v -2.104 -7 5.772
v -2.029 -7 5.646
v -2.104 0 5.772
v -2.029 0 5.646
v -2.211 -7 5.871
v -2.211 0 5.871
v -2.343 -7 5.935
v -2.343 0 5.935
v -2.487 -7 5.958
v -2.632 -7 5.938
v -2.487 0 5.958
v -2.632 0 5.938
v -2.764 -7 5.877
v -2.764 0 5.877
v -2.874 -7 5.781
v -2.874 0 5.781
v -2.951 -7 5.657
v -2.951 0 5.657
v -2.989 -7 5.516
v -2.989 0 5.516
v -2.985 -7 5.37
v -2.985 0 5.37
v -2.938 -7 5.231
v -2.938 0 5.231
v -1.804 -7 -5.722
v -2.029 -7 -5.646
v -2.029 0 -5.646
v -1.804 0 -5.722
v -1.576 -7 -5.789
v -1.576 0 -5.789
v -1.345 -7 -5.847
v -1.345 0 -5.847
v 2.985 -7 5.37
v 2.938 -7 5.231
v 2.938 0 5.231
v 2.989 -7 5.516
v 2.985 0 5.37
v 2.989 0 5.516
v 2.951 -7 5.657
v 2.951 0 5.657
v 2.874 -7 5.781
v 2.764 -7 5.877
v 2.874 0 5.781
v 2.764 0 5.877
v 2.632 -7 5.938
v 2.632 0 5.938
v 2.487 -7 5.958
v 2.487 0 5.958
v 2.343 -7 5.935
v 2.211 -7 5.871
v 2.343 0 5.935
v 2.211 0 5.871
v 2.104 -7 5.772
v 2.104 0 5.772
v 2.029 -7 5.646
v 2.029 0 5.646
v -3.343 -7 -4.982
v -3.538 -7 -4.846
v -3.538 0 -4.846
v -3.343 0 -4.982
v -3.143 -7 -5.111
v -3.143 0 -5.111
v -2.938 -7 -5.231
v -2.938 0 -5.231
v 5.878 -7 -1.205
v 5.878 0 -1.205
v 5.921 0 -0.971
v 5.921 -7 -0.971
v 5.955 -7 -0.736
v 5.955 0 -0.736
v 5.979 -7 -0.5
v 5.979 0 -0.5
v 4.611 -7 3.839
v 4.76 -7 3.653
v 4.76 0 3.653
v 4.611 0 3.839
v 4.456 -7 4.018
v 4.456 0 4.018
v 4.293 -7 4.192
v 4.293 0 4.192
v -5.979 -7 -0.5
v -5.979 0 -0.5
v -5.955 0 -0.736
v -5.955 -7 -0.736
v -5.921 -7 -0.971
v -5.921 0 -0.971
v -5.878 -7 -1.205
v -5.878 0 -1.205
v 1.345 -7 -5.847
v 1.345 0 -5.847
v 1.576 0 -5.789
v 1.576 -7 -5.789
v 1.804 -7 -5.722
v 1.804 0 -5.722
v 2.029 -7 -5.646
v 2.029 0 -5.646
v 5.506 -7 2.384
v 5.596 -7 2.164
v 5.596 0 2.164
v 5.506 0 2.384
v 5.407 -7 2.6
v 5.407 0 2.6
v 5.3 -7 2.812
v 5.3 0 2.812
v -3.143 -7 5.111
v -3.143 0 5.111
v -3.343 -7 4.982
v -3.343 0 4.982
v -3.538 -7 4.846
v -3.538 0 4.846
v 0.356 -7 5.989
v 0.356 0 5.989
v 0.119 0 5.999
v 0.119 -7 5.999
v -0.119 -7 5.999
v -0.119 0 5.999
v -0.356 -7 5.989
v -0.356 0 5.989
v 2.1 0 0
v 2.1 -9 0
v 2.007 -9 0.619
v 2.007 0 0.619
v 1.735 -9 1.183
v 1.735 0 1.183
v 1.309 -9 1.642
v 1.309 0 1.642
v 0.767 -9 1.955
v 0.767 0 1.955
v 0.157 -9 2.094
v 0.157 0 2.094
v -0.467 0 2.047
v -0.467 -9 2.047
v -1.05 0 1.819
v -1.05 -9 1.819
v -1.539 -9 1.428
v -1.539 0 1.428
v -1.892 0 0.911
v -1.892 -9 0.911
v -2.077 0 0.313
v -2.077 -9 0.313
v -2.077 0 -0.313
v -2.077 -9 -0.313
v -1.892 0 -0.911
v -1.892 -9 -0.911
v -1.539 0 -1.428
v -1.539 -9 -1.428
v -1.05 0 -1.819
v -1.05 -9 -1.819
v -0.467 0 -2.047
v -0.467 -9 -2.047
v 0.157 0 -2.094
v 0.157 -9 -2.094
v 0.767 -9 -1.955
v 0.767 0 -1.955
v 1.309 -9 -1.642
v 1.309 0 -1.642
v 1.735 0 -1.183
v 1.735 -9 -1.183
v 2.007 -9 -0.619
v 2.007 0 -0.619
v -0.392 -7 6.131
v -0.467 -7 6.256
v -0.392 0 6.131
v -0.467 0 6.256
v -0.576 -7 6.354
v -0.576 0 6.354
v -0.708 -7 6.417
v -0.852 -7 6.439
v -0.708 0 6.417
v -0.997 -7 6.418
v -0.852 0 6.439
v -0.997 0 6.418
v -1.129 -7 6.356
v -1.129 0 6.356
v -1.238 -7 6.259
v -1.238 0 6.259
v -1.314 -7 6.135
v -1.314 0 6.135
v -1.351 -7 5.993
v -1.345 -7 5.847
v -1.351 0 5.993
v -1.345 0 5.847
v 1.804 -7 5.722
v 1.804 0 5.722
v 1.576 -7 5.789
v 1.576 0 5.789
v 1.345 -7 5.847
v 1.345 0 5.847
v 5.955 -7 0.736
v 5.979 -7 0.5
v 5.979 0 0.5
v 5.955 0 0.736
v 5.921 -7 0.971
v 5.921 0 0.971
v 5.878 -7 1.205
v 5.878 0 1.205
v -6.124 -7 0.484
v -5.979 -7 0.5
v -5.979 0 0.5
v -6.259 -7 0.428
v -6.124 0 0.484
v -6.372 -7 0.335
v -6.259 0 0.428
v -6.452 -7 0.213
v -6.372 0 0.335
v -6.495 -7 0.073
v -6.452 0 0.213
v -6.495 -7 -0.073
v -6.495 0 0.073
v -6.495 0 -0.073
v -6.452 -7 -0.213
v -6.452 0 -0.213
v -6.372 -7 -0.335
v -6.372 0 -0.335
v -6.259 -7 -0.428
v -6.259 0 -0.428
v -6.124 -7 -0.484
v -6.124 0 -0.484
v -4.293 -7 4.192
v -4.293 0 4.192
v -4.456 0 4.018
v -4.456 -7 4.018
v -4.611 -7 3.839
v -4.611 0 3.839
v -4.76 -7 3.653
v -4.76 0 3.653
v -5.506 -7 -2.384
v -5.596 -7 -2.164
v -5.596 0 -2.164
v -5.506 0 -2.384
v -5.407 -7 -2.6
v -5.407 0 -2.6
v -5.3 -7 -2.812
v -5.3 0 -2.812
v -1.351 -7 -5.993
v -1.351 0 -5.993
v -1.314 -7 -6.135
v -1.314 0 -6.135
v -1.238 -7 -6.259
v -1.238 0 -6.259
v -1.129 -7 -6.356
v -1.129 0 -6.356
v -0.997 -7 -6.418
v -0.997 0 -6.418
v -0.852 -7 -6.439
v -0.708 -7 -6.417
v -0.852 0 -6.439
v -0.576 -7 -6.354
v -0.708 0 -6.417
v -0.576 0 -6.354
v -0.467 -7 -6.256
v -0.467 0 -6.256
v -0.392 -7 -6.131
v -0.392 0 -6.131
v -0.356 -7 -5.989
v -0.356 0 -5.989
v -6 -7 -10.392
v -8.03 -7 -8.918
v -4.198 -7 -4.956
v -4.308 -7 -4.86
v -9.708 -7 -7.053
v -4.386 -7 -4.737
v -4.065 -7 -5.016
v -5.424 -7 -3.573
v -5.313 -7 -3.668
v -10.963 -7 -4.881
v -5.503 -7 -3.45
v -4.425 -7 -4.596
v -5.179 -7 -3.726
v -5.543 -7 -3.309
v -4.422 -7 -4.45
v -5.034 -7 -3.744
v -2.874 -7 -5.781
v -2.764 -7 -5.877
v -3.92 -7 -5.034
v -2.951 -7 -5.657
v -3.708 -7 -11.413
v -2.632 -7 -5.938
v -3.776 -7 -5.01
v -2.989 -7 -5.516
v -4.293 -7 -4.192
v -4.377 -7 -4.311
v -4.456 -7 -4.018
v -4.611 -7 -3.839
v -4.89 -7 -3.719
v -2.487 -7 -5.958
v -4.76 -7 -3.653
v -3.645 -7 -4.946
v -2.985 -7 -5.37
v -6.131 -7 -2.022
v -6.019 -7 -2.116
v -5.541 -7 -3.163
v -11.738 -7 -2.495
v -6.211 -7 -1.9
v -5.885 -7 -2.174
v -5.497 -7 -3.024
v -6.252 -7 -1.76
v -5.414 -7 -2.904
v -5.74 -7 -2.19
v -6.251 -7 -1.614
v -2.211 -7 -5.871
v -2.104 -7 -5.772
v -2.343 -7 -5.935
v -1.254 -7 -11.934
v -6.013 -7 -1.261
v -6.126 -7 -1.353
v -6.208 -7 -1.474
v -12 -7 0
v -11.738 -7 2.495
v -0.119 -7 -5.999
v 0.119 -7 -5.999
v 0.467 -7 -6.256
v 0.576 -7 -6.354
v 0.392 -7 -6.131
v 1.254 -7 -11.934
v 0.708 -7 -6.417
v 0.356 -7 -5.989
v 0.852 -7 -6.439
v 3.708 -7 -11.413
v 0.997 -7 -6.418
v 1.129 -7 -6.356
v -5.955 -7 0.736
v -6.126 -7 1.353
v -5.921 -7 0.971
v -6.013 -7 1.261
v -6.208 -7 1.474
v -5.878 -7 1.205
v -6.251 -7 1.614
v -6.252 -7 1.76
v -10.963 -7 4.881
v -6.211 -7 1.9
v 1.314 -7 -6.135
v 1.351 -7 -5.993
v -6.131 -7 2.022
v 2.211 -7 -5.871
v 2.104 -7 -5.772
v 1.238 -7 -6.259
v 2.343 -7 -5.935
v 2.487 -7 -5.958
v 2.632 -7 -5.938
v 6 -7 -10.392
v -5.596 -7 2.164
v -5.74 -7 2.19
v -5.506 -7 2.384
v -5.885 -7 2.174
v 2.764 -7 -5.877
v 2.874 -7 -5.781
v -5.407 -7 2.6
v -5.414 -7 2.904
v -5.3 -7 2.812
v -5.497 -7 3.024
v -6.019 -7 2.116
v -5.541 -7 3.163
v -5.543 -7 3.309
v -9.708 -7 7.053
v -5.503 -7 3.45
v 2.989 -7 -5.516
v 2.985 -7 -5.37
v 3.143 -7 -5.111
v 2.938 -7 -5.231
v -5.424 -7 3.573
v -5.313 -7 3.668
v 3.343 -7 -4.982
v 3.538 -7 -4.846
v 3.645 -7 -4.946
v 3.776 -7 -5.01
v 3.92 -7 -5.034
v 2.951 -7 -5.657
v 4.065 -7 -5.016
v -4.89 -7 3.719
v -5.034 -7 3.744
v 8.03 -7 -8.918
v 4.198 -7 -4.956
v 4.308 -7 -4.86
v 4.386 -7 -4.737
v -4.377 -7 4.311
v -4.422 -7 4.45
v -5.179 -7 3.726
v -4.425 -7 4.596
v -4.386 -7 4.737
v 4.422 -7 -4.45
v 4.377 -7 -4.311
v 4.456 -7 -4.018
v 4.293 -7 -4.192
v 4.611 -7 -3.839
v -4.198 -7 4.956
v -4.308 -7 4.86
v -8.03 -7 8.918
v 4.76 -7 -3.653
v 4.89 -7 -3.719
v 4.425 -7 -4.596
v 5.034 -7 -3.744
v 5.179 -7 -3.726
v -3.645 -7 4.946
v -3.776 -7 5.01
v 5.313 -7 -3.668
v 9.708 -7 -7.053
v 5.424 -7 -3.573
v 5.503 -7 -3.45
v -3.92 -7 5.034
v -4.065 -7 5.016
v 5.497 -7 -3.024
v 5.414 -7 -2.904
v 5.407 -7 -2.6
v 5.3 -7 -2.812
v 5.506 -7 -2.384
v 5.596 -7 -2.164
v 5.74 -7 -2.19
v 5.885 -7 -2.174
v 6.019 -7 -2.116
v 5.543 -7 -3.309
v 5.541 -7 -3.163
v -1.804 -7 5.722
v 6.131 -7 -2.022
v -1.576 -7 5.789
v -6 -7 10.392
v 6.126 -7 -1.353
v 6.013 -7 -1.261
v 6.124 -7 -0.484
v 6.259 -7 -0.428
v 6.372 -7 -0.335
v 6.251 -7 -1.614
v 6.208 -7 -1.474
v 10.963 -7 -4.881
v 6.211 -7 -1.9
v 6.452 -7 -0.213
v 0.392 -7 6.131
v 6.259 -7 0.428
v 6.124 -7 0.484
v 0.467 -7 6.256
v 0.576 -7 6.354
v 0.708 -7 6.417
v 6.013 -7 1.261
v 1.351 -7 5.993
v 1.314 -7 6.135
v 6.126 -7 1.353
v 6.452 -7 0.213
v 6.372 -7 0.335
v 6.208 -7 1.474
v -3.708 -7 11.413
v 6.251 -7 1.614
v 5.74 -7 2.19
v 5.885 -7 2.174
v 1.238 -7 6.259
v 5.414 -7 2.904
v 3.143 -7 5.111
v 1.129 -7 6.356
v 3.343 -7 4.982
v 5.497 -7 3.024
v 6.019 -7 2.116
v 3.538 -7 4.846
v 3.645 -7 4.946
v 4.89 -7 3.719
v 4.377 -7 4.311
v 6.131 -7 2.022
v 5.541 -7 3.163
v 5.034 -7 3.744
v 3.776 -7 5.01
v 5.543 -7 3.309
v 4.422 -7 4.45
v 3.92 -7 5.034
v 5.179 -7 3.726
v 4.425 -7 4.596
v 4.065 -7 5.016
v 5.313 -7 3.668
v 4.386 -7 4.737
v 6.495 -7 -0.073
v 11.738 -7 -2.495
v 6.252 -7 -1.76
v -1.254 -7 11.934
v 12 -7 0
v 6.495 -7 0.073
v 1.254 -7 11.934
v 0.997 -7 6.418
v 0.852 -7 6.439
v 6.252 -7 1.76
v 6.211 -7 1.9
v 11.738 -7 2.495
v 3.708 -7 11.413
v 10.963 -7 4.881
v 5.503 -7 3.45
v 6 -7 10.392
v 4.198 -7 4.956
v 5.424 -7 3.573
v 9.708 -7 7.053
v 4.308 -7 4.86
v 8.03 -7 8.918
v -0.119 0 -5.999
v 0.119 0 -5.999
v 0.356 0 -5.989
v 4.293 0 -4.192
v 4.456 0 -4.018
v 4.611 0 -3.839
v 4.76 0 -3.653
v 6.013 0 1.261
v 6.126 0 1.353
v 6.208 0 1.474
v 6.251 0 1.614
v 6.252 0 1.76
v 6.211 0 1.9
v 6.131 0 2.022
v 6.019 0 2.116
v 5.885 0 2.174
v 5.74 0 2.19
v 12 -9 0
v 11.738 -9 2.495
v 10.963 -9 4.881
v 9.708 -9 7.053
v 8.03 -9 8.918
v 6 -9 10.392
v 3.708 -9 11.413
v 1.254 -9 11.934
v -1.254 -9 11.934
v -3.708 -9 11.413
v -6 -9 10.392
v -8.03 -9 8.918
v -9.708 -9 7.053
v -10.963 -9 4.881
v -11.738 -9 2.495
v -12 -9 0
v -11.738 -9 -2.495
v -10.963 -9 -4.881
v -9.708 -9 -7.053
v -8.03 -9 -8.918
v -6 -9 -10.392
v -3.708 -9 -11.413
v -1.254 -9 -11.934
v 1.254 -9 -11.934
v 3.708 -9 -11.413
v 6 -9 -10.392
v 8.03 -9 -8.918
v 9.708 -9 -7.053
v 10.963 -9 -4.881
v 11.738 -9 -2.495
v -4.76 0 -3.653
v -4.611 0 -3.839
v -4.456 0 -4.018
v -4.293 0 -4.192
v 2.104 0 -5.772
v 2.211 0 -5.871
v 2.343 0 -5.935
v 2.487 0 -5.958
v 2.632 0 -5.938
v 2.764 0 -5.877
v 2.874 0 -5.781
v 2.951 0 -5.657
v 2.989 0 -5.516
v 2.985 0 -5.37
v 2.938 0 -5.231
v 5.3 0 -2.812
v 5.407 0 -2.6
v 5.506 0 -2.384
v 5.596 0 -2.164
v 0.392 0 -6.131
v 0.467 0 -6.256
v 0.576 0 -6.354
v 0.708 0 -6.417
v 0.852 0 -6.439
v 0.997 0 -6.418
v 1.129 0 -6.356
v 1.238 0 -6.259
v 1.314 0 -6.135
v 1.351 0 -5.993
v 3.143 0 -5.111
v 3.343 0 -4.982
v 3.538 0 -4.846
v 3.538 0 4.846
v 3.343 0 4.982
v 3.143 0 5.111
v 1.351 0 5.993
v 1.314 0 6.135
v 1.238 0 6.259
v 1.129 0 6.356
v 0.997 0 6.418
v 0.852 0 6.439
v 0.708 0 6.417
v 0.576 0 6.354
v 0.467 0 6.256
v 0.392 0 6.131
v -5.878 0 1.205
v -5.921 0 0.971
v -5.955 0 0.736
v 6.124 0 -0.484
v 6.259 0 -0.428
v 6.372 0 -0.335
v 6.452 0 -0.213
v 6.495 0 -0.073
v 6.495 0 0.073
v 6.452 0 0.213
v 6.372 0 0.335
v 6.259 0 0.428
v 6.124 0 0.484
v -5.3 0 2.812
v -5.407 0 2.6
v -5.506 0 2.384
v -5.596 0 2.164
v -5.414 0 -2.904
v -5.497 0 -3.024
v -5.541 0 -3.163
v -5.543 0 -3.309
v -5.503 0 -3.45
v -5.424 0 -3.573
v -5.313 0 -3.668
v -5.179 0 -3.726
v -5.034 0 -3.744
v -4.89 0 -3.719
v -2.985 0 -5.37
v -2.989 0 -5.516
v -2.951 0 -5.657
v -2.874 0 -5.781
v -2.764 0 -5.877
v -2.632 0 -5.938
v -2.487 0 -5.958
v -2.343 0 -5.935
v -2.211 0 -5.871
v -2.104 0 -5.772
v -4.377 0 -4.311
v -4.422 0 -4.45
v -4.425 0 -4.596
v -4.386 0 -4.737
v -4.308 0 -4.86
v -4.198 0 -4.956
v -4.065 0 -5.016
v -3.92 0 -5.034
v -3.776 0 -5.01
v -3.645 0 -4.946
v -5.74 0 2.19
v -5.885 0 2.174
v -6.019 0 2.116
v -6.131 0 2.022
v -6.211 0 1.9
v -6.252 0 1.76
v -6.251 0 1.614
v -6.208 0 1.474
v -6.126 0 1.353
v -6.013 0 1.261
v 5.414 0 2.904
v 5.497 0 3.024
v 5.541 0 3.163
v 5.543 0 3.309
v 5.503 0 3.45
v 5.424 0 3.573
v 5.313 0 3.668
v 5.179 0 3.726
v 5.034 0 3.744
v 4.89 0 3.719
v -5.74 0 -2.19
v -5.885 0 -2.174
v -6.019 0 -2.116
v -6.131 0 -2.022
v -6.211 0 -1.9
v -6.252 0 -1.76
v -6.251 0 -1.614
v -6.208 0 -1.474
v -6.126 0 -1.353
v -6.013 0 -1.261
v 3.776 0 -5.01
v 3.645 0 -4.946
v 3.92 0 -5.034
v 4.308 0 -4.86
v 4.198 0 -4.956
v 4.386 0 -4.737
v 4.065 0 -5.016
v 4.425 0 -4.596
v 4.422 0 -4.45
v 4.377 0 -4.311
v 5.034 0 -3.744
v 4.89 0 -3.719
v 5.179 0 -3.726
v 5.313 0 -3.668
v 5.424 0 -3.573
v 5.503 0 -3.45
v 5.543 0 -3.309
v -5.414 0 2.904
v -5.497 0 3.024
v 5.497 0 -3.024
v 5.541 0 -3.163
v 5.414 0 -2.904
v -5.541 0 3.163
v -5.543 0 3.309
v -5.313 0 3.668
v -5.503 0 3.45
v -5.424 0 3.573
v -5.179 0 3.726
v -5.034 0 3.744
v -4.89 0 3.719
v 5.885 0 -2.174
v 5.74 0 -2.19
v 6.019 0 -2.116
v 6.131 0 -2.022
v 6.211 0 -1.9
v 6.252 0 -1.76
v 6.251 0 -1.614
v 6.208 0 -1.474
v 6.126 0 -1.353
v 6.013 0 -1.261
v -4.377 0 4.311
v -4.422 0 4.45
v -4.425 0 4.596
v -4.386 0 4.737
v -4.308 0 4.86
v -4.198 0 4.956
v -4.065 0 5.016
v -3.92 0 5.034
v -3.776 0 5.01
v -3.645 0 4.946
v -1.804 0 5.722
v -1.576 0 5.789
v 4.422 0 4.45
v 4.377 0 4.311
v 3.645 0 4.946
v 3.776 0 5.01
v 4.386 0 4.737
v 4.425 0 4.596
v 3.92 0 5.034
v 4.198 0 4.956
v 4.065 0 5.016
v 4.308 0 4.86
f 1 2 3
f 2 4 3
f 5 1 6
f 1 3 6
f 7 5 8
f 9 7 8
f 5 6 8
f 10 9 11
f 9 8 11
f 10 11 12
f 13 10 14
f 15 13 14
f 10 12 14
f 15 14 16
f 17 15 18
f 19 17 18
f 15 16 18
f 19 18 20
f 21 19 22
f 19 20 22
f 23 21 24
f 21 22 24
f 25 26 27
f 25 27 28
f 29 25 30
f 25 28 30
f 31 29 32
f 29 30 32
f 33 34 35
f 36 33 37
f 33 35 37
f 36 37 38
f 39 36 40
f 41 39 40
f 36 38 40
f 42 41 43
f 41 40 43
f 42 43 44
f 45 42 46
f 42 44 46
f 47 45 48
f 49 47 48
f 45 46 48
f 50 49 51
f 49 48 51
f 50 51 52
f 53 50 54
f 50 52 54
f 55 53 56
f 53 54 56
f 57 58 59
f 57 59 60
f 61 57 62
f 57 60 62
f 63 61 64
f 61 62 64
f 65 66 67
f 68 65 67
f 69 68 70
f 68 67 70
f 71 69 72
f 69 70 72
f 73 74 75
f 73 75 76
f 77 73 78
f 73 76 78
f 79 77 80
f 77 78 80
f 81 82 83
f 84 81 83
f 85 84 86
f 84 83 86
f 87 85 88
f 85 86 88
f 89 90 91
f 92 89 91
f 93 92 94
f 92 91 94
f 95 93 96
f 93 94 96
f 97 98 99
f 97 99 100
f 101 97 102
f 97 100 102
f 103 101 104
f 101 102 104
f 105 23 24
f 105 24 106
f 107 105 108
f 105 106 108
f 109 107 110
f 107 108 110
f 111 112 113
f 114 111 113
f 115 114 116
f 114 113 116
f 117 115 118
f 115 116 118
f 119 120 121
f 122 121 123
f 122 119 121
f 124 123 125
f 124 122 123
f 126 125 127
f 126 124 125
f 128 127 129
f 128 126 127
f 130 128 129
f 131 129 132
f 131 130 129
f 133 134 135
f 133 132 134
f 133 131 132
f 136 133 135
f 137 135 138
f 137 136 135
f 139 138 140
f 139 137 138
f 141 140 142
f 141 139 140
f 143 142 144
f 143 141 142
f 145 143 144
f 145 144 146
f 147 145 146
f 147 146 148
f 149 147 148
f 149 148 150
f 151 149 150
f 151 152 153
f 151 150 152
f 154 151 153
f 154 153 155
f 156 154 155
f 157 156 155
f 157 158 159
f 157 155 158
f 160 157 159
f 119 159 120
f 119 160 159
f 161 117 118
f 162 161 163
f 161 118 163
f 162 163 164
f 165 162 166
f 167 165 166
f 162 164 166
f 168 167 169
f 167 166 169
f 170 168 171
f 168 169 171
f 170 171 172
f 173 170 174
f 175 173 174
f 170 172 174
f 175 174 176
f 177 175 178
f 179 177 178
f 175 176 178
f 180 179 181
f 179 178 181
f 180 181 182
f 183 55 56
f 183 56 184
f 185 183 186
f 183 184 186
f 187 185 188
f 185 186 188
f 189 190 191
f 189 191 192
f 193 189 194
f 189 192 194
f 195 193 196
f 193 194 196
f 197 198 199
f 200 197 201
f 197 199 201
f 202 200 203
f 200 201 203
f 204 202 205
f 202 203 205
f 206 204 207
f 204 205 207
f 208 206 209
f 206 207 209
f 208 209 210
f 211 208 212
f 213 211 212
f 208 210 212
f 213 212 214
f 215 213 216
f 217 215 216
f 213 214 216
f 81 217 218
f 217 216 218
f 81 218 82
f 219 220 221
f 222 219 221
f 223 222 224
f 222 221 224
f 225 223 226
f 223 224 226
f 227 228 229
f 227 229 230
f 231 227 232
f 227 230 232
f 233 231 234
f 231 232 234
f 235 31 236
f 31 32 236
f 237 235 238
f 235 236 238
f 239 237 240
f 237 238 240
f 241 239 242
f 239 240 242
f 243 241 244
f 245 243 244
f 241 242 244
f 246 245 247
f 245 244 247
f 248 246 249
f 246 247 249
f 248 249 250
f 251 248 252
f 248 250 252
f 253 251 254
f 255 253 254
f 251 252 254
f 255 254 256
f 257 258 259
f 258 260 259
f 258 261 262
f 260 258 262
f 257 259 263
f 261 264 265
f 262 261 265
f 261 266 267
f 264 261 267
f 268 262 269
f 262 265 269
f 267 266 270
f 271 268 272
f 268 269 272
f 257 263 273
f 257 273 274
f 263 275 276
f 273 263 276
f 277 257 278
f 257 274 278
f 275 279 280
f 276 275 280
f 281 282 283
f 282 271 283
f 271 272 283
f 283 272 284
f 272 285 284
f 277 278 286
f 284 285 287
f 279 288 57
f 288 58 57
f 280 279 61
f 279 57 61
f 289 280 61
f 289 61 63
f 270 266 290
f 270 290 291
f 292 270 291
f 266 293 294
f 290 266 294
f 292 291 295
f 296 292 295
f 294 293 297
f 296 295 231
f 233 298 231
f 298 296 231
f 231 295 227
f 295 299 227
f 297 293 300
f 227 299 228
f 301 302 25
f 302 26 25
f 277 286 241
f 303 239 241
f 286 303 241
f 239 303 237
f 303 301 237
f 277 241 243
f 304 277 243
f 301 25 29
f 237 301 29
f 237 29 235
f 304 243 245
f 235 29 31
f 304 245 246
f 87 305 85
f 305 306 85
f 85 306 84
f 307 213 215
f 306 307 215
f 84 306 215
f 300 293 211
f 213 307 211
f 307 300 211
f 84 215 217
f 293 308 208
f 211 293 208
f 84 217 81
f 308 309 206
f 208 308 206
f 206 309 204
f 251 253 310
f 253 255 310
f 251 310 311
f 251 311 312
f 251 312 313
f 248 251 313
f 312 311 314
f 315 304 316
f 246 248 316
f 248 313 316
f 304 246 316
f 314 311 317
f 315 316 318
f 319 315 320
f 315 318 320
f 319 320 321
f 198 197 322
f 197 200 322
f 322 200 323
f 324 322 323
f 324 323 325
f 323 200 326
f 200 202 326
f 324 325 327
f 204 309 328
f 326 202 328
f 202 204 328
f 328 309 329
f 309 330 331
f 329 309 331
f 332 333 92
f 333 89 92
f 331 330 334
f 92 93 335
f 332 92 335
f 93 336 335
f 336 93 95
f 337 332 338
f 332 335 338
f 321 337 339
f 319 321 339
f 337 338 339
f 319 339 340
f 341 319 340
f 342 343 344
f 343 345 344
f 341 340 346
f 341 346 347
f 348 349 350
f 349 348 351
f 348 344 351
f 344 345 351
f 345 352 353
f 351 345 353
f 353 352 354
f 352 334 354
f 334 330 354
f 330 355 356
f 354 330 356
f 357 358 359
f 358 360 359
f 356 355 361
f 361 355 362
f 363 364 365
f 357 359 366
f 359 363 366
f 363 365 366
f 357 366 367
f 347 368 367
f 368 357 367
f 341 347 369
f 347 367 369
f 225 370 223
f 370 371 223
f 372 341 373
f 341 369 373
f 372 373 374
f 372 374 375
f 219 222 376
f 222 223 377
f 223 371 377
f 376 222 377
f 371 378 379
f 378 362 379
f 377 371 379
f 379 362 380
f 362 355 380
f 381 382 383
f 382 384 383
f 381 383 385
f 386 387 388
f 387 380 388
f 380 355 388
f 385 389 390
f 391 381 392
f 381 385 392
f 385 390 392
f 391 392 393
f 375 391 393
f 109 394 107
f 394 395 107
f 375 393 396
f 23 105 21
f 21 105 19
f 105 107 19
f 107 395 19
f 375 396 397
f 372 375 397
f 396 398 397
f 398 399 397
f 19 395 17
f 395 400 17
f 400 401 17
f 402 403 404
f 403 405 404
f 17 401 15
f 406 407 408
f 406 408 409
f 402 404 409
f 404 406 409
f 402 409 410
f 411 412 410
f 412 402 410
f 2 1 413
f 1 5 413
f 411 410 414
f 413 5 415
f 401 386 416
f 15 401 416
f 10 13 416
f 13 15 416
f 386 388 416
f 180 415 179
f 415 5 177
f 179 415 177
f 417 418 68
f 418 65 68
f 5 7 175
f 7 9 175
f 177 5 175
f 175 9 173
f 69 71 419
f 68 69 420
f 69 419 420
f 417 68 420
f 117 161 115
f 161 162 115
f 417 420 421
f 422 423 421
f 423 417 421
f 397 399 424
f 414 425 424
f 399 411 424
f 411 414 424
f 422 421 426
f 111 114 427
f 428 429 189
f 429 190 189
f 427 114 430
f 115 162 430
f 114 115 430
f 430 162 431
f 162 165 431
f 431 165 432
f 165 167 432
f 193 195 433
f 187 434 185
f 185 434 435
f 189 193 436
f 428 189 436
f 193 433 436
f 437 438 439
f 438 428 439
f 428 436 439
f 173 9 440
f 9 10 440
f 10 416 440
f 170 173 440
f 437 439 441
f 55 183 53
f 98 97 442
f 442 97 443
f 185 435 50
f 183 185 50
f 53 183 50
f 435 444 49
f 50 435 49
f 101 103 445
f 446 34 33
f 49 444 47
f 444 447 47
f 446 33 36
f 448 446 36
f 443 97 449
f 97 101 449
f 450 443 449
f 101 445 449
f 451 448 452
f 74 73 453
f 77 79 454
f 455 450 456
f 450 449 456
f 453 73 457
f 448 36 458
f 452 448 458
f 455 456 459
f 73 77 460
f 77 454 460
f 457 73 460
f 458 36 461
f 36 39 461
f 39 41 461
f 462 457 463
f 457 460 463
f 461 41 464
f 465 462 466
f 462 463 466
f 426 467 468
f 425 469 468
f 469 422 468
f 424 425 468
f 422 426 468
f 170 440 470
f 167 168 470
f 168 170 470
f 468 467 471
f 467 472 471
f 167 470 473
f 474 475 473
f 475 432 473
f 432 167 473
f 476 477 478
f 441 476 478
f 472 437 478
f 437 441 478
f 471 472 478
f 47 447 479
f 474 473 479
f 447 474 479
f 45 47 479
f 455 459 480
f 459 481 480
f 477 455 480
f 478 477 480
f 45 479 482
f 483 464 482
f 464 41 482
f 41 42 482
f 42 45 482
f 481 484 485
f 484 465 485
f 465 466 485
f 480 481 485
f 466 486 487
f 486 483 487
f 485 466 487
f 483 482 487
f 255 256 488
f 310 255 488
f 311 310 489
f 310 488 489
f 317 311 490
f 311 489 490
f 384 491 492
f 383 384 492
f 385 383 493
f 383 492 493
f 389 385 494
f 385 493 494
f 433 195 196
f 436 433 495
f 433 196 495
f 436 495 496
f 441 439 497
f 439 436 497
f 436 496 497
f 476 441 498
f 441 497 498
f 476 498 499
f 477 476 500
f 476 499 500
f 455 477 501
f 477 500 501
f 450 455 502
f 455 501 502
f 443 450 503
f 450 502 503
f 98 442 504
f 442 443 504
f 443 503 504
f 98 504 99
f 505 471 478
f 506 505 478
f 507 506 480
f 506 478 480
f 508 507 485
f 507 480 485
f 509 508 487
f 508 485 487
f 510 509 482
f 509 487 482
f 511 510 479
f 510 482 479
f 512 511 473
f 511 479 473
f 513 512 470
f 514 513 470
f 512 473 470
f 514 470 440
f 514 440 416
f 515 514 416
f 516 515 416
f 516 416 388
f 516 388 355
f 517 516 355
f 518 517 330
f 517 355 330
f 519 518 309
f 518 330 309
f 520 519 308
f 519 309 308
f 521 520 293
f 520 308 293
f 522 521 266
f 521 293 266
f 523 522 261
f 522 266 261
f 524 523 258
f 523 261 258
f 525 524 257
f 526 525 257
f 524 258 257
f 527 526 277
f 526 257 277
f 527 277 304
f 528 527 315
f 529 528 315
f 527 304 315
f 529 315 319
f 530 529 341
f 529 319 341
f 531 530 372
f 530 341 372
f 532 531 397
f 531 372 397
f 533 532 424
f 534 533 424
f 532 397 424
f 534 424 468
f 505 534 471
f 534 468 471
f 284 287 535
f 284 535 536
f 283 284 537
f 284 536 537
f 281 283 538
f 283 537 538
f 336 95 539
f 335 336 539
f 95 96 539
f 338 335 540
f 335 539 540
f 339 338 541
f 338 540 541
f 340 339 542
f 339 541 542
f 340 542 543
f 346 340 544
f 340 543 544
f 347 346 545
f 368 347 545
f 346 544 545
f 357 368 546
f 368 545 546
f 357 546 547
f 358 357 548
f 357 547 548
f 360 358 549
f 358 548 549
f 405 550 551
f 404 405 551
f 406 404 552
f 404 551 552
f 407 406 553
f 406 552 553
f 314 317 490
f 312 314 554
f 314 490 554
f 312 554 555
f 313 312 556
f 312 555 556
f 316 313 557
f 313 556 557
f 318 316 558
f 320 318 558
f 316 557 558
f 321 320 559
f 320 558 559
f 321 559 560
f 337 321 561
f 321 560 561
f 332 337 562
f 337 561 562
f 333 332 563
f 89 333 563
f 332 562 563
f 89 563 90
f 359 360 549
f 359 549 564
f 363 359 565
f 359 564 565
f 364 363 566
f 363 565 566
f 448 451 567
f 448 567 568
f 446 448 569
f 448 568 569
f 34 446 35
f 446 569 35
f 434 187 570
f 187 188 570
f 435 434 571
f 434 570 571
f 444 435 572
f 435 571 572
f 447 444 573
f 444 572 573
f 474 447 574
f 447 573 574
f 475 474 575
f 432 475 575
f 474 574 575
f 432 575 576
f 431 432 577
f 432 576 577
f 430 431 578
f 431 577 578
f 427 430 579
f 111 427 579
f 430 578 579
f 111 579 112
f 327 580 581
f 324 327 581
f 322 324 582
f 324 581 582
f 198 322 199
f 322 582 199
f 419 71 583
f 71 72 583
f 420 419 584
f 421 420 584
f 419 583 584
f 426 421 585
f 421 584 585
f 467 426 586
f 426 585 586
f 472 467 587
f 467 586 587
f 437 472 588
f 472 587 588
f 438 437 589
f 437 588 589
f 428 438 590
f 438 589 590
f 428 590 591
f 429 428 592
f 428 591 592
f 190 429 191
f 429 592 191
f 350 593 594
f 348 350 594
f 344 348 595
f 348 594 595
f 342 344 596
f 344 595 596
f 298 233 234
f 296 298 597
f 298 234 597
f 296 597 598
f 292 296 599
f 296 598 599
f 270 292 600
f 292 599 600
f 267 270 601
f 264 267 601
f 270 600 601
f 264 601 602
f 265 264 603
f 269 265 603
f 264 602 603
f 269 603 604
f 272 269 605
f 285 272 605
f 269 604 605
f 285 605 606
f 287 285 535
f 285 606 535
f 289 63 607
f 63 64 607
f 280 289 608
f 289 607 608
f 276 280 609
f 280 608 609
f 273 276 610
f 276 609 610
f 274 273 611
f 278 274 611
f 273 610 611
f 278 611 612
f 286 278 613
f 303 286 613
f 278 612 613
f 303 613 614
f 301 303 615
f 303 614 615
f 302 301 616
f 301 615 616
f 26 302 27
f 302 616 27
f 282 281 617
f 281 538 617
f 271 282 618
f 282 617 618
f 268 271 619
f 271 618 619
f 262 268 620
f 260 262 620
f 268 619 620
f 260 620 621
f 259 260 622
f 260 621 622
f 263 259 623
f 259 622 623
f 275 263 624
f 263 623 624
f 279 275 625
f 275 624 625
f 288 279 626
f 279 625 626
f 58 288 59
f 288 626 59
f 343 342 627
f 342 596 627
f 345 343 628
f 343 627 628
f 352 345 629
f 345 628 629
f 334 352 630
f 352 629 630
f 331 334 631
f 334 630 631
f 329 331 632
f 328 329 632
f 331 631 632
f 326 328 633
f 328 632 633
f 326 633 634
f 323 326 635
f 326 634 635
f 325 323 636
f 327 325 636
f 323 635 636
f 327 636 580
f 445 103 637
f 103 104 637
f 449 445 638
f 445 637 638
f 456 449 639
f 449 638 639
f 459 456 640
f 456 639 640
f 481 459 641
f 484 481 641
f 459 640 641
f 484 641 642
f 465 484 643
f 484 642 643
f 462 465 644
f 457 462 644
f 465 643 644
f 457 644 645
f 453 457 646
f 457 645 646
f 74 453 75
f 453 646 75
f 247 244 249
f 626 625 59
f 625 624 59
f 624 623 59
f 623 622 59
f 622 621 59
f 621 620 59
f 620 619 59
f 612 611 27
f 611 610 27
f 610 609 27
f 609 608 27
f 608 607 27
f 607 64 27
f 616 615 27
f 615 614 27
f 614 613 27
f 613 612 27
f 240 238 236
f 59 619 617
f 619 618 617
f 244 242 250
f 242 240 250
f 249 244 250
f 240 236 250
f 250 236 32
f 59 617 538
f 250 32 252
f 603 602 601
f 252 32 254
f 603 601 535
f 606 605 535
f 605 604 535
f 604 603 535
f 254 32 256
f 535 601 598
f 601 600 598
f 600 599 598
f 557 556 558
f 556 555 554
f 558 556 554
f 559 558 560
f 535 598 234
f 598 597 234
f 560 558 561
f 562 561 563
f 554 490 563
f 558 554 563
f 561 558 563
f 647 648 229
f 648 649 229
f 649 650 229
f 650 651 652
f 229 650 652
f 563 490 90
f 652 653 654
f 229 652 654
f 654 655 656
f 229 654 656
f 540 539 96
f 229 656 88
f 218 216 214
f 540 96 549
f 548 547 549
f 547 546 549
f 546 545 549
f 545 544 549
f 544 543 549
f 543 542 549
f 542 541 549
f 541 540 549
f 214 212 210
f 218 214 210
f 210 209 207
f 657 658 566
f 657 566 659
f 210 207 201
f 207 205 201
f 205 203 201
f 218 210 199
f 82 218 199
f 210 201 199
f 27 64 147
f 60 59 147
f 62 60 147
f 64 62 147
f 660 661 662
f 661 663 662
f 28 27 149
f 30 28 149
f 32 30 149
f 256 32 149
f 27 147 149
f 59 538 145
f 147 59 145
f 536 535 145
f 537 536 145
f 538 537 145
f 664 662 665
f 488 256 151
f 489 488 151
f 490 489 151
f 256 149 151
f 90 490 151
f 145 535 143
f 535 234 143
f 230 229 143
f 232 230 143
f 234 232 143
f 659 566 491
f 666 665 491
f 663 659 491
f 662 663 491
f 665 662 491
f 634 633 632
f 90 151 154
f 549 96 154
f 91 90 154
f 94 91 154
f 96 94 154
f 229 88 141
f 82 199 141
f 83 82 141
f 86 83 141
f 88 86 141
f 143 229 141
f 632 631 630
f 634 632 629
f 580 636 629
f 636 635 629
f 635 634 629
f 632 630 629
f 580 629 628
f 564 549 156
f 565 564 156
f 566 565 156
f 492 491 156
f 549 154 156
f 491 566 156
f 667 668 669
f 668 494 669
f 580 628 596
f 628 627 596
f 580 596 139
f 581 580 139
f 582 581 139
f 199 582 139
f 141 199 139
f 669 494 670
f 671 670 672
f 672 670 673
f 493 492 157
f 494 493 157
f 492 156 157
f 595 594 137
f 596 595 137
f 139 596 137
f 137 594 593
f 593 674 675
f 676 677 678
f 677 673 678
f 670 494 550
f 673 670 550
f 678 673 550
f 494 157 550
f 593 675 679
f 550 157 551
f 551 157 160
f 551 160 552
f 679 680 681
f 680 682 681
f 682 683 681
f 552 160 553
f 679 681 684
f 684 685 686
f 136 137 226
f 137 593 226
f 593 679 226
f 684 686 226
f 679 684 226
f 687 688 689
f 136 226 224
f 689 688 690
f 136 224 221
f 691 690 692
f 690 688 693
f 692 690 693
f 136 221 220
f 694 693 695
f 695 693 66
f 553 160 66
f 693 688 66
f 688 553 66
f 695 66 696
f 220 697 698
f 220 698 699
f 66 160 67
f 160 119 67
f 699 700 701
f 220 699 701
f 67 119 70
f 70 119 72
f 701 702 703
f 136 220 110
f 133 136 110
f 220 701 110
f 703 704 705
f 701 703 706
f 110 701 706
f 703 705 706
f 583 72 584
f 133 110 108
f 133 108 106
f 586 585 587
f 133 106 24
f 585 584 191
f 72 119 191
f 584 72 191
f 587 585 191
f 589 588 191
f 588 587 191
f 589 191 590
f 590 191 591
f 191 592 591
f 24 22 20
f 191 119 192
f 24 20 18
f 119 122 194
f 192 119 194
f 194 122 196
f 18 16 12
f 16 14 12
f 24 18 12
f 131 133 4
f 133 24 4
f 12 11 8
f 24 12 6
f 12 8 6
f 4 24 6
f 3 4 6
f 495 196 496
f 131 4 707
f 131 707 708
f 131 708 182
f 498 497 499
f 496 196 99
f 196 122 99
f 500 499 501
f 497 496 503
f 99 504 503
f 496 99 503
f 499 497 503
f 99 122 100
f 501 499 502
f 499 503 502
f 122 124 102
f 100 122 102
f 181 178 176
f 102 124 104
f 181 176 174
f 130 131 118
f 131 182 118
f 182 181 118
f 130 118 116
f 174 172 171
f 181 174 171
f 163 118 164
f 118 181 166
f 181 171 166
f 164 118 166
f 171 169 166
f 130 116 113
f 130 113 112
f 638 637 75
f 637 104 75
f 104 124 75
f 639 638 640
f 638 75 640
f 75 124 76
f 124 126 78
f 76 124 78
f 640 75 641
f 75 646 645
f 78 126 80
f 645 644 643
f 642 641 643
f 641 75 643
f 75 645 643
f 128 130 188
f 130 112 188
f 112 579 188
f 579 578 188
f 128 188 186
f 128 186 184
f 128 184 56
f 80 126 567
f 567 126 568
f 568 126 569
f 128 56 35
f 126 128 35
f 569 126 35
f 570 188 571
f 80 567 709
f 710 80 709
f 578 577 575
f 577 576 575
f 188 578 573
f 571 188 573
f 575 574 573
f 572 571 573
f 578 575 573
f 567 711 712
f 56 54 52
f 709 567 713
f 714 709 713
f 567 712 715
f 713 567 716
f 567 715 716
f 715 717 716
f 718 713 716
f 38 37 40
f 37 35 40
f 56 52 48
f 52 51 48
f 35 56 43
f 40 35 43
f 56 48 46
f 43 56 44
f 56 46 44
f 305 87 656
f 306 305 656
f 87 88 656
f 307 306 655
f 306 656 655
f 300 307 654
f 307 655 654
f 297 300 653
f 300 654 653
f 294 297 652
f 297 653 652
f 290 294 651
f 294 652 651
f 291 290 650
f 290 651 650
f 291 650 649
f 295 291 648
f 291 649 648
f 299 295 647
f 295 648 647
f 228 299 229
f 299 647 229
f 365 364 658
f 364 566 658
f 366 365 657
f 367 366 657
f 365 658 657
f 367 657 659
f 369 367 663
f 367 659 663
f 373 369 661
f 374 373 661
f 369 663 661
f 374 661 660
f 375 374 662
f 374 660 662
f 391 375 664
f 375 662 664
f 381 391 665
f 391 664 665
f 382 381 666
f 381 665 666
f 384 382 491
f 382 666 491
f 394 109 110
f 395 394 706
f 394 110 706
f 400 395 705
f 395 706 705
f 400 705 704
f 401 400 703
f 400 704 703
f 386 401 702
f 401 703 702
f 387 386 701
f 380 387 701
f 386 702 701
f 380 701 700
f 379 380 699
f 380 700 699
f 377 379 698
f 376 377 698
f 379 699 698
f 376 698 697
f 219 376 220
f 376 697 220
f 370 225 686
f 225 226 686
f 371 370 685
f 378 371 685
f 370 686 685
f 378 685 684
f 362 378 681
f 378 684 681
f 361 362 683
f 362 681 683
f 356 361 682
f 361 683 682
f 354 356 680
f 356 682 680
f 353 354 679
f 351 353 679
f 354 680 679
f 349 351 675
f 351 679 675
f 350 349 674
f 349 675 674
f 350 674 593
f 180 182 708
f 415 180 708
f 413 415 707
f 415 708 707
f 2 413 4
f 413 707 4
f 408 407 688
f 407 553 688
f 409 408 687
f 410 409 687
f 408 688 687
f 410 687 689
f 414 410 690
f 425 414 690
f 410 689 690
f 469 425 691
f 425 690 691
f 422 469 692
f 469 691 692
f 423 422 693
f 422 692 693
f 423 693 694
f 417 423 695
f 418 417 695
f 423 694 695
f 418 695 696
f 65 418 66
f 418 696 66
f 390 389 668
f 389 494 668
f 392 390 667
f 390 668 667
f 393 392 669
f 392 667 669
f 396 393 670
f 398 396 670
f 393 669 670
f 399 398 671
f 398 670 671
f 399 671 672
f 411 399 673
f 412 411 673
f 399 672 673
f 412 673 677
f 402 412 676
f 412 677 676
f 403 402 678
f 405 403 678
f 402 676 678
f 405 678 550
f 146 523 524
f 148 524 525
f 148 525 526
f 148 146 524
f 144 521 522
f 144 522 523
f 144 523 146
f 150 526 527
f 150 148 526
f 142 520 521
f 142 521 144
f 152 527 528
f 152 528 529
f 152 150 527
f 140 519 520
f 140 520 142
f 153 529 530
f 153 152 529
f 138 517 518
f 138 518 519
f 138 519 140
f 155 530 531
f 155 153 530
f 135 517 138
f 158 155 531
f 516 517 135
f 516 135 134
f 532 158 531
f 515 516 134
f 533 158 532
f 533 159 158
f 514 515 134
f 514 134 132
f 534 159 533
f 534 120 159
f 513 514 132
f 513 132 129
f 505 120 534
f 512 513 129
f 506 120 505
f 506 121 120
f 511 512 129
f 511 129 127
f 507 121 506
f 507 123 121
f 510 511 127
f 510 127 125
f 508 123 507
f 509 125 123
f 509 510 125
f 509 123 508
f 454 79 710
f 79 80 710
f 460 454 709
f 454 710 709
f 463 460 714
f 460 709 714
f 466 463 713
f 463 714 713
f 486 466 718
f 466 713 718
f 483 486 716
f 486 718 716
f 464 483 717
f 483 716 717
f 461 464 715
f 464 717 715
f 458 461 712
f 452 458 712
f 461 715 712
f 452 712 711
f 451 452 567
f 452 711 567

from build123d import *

# Parameters (mm, degrees)
CYLINDER011007_R     = 2.1
CYLINDER011007_DEPTH = 20
CYLINDER011006_R     = 12
CYLINDER011006_DEPTH = 2
CYLINDER011009_R     = 0.5
CYLINDER011009_DEPTH = 7
ARRAY007_COUNT       = 22
CYLINDER011005_R     = 6
CYLINDER011005_DEPTH = 7


with BuildPart() as belt_attach_insert_hole:
    # Cylinder011007 → Cylinder011007 (new body)
    with BuildSketch(Plane.XZ):
        Circle(CYLINDER011007_R)
    extrude(amount=CYLINDER011007_DEPTH)


with BuildPart() as belt_disk:
    # Cylinder011006 → Cylinder011006 (new body)
    with BuildSketch(Plane.XZ.offset(7)):
        Circle(CYLINDER011006_R)
    extrude(amount=CYLINDER011006_DEPTH)


with BuildPart() as belt_pin_array:
    # Cylinder011009 → Cylinder011009 (new body)
    with BuildSketch(Plane(origin=(6, 0, 0), x_dir=(1, 0, 0), z_dir=(0, -1, 0))):
        Circle(CYLINDER011009_R)
    extrude(amount=CYLINDER011009_DEPTH)

    # Array007: belt pin array ×22 about axis
    array007_axis = Axis((0, 0, 0), (0, 1, 0))


with BuildPart() as belt_pin_array_1:
    add(belt_pin_array.part)
    for i in range(1, ARRAY007_COUNT):
        add(belt_pin_array.part.rotate(array007_axis, i * 360 / ARRAY007_COUNT))


with BuildPart() as belt_attach_cut:
    # Cylinder011005 → Cylinder011005 (new body)
    with BuildSketch(Plane.XZ):
        Circle(CYLINDER011005_R)
    extrude(amount=CYLINDER011005_DEPTH)

    # Fusion003: union belt disk, belt pin array
    add(belt_disk.part)
    add(belt_pin_array_1.part)

    # Cut023015009007: cut belt attach insert hole
    add(belt_attach_insert_hole.part, mode=Mode.SUBTRACT)


solid = belt_attach_cut.part
